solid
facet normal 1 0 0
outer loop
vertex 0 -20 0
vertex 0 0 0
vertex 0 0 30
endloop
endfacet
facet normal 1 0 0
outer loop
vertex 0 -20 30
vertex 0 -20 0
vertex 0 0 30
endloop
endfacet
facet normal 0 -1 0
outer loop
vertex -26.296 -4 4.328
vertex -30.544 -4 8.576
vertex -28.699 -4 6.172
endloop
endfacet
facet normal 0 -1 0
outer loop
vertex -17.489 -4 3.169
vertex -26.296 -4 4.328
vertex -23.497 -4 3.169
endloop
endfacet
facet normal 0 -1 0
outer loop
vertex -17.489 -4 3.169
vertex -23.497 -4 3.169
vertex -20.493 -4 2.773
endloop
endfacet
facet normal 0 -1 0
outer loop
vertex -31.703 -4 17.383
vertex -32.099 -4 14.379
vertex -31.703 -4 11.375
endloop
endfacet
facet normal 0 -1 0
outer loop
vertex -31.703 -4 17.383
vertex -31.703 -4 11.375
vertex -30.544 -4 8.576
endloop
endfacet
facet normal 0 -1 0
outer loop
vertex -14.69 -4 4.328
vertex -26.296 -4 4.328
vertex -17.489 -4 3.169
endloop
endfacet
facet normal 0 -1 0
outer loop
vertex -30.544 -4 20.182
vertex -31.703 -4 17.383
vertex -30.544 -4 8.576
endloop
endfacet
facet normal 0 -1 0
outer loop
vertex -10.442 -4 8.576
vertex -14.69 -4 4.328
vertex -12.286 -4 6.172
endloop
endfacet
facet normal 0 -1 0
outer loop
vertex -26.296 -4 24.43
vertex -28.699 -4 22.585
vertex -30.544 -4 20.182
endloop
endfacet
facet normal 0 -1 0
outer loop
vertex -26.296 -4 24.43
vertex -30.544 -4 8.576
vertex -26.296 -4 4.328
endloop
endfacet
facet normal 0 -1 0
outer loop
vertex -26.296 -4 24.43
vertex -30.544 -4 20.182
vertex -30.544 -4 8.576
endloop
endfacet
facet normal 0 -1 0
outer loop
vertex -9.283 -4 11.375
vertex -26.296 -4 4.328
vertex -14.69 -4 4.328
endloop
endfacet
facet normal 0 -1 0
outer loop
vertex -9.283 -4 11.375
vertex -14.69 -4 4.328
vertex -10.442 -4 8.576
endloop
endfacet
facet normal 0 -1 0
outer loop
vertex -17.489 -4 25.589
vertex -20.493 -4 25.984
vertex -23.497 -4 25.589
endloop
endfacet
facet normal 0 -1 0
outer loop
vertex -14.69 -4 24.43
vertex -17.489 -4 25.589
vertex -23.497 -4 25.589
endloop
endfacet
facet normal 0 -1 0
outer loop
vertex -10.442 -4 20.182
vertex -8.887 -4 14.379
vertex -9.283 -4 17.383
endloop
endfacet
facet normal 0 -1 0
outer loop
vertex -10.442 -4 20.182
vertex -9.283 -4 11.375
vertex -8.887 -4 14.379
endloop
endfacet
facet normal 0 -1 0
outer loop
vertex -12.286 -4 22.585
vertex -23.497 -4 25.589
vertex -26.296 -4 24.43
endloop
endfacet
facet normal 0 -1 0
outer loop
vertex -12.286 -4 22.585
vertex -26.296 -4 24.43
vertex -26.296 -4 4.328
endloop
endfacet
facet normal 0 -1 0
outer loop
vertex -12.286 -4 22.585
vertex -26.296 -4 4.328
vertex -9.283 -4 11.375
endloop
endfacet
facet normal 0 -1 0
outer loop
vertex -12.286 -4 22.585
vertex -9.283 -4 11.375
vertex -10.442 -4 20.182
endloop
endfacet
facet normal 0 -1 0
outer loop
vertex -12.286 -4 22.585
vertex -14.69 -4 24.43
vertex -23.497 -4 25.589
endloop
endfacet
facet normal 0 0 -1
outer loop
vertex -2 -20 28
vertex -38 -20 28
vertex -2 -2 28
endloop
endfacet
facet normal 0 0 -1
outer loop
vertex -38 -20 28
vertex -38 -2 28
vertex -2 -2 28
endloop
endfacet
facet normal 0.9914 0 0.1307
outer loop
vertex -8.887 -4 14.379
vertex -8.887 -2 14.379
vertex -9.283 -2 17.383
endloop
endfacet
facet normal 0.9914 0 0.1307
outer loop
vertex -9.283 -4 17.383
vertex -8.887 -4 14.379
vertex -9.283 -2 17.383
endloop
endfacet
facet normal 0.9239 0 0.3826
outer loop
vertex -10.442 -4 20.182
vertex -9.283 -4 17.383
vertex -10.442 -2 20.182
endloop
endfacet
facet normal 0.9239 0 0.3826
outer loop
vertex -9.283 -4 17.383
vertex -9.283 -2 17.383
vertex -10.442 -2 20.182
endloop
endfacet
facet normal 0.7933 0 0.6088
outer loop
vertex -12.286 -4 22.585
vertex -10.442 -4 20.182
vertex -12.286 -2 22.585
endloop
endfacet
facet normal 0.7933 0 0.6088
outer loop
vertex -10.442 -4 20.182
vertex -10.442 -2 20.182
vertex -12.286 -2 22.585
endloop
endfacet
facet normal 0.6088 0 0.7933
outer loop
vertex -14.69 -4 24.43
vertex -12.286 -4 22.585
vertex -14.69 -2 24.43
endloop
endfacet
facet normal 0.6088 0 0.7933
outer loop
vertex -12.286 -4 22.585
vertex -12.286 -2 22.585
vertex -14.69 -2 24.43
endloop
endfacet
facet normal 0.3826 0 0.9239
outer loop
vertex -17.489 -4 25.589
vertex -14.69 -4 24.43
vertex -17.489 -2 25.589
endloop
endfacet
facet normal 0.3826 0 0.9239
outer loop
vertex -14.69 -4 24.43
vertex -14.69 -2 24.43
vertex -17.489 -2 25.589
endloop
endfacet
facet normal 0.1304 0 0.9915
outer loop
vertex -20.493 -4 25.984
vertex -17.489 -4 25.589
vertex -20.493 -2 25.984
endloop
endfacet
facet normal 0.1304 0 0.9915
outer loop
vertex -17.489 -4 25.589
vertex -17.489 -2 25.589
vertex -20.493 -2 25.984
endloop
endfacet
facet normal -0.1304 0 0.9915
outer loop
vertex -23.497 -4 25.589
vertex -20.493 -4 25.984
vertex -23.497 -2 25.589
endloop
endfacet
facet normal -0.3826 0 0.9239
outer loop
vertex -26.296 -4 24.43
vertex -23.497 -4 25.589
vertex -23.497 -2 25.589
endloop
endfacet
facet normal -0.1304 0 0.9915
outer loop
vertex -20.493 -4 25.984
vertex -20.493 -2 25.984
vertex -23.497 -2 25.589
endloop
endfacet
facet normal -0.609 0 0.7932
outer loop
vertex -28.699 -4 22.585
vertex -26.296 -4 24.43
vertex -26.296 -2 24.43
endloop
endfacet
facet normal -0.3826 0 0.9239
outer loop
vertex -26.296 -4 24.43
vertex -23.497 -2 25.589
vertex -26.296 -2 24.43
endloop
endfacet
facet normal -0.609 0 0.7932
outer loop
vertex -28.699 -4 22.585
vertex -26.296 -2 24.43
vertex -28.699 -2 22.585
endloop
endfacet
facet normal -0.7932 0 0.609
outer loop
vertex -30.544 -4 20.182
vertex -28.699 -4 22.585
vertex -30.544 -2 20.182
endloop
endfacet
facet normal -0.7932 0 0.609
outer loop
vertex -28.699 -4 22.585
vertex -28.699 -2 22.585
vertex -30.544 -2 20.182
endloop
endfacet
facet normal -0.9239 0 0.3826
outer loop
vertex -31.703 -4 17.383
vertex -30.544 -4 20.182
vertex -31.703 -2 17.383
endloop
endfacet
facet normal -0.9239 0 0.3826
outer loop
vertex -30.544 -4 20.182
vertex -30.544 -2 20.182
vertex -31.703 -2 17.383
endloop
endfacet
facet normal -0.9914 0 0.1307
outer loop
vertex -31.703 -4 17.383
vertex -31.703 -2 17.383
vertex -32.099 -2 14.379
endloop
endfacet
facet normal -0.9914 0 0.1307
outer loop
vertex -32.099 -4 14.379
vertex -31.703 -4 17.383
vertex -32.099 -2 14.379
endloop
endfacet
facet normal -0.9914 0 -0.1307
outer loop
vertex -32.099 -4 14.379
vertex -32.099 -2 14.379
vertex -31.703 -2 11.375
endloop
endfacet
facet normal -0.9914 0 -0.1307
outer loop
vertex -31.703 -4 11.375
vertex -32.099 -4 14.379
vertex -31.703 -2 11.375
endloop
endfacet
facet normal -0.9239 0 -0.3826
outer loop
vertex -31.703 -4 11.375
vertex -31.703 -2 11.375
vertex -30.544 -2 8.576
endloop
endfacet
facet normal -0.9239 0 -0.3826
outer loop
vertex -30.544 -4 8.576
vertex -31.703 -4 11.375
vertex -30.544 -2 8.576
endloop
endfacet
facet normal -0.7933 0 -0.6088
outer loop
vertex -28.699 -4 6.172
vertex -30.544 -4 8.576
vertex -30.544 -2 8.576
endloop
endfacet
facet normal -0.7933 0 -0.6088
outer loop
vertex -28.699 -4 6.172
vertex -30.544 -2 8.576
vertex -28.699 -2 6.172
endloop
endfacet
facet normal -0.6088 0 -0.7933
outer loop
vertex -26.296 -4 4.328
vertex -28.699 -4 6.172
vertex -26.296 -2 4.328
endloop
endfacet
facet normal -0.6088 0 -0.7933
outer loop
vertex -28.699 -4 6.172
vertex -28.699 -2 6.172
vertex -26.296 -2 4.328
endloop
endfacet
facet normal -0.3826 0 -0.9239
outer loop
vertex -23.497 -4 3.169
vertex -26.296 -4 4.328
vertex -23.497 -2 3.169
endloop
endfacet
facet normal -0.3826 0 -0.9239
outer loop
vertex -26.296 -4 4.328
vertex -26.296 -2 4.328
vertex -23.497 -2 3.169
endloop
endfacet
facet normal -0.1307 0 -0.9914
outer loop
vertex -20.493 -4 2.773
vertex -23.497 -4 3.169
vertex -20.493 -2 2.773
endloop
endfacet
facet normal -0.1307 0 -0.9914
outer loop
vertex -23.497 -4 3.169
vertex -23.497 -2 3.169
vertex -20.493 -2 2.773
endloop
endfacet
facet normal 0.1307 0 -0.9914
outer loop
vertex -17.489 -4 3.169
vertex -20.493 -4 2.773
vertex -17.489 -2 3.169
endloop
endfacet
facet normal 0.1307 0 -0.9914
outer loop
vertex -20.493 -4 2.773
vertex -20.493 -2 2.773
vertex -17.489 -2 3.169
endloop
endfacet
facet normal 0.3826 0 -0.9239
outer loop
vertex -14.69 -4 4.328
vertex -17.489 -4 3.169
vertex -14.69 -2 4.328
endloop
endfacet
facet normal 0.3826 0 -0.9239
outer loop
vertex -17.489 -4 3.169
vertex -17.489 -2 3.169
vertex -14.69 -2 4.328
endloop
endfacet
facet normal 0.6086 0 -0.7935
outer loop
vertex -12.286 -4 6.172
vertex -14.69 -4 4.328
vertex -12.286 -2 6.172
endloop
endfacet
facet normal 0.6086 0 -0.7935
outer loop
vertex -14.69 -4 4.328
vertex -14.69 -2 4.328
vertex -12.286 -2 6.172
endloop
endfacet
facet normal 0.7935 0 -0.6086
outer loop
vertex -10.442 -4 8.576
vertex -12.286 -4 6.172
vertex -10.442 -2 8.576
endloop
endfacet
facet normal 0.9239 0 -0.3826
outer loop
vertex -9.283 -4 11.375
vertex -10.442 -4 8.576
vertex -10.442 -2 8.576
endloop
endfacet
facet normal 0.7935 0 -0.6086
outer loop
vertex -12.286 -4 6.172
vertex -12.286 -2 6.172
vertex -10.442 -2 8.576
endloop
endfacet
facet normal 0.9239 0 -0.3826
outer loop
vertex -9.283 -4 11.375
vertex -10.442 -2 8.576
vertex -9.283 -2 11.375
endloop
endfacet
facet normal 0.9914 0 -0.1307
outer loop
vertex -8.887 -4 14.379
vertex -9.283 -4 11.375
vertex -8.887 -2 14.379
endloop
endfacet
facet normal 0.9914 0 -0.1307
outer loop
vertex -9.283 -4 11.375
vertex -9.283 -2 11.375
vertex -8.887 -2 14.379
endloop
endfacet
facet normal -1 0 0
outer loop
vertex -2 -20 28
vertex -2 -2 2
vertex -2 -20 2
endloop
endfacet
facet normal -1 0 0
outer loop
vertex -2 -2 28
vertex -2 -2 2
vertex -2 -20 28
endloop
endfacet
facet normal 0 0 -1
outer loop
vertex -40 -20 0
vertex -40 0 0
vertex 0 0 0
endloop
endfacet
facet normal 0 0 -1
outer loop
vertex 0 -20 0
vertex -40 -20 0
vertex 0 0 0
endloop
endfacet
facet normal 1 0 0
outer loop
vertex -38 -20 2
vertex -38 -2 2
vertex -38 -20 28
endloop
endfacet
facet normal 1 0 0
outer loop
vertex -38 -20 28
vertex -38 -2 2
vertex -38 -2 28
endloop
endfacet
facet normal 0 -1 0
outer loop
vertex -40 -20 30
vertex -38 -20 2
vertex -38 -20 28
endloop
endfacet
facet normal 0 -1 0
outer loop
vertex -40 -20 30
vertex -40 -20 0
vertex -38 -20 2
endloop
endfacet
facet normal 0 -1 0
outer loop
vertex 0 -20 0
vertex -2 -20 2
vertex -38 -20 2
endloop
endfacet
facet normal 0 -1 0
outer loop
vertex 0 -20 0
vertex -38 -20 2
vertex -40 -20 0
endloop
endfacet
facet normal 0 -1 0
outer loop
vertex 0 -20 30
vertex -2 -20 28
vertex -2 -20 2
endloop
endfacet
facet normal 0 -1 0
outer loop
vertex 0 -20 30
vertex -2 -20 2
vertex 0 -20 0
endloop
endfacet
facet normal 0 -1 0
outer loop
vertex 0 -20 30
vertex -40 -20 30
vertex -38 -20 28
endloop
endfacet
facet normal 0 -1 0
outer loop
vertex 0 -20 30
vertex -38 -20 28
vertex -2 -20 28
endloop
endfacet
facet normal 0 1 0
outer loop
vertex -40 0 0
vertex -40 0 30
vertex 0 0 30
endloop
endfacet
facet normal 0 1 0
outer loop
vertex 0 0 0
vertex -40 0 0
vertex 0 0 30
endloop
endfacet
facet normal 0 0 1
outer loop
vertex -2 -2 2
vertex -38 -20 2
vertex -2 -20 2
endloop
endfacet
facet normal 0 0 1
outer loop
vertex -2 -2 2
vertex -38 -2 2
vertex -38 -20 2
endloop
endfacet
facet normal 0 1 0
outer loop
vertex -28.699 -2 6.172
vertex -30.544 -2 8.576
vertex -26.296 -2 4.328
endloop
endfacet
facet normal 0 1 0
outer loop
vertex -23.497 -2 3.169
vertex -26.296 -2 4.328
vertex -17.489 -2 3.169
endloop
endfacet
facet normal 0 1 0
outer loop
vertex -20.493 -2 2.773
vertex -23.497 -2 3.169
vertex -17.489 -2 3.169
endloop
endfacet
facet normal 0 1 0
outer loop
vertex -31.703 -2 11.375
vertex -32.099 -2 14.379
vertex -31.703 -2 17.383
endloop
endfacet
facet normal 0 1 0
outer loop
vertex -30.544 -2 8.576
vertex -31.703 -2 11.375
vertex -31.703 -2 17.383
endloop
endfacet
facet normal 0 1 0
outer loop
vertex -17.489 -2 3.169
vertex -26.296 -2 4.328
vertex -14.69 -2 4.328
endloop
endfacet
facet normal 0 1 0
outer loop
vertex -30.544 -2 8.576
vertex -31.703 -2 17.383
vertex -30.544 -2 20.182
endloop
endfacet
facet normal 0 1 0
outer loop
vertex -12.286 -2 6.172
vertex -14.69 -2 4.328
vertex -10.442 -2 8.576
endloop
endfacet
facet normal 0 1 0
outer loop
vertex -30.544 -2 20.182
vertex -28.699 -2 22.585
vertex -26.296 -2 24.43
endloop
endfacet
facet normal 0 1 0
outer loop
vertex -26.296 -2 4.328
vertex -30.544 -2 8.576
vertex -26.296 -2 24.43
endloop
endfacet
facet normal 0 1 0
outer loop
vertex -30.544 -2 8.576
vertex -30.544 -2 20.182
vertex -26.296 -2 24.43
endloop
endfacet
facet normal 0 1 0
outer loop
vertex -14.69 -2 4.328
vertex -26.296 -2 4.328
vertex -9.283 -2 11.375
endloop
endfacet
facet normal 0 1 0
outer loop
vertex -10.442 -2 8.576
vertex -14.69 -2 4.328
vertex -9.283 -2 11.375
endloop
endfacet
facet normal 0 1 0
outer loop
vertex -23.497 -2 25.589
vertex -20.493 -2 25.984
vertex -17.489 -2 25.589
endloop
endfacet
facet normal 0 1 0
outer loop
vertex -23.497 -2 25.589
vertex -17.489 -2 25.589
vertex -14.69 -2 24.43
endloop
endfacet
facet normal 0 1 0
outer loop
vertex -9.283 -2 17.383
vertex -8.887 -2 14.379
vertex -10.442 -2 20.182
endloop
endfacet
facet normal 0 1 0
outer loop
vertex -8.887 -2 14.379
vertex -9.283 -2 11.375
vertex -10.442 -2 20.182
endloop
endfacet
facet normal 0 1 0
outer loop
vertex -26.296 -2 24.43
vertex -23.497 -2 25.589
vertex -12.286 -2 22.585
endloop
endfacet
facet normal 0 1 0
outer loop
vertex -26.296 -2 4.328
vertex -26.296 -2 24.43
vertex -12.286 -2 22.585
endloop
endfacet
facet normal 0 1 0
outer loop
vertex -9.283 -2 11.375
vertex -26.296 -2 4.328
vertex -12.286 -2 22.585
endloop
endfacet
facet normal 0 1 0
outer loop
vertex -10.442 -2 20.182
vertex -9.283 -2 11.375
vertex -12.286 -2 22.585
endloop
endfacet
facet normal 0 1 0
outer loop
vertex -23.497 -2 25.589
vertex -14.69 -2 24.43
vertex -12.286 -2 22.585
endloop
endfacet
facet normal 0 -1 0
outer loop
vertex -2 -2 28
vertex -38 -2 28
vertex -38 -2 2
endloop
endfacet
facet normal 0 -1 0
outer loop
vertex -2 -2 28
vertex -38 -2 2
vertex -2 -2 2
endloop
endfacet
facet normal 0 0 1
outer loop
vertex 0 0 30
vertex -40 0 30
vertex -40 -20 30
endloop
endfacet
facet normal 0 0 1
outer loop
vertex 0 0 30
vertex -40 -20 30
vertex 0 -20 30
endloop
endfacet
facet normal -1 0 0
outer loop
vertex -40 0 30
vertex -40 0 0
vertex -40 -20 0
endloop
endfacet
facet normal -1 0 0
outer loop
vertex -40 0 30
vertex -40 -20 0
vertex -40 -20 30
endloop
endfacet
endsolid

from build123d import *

# Parameters (mm, degrees)
F0_W     = 40
F0_H     = 30
F1_DEPTH = 20
F2_T     = -2
F3_R     = 11.6056457338
F4_DEPTH = 2


# Not quite as in the source:
# - the program builds the solid bodies; features that only make, move or delete a surface that nothing else refers to are left out


with BuildPart() as f1:
    # F0 (on Front) → F1 (new body)
    with BuildSketch(Plane.XZ):
        with Locations((-20, 15)):
            Rectangle(F0_W, F0_H)
    extrude(amount=F1_DEPTH)

    # F2
    f2_openings = [f1.faces().sort_by_distance(p)[0] for p in [
        (-20, -20, 15),
    ]]
    offset(amount=F2_T, openings=f2_openings)


with BuildPart() as f4:
    # F3 (on face) → F4 (new body)
    with BuildSketch(Plane.XZ.offset(2)):
        with Locations((-20.4928908497, 14.3788000569)):
            Circle(F3_R)
    extrude(amount=F4_DEPTH)


solid = Compound([f1.part, f4.part])
